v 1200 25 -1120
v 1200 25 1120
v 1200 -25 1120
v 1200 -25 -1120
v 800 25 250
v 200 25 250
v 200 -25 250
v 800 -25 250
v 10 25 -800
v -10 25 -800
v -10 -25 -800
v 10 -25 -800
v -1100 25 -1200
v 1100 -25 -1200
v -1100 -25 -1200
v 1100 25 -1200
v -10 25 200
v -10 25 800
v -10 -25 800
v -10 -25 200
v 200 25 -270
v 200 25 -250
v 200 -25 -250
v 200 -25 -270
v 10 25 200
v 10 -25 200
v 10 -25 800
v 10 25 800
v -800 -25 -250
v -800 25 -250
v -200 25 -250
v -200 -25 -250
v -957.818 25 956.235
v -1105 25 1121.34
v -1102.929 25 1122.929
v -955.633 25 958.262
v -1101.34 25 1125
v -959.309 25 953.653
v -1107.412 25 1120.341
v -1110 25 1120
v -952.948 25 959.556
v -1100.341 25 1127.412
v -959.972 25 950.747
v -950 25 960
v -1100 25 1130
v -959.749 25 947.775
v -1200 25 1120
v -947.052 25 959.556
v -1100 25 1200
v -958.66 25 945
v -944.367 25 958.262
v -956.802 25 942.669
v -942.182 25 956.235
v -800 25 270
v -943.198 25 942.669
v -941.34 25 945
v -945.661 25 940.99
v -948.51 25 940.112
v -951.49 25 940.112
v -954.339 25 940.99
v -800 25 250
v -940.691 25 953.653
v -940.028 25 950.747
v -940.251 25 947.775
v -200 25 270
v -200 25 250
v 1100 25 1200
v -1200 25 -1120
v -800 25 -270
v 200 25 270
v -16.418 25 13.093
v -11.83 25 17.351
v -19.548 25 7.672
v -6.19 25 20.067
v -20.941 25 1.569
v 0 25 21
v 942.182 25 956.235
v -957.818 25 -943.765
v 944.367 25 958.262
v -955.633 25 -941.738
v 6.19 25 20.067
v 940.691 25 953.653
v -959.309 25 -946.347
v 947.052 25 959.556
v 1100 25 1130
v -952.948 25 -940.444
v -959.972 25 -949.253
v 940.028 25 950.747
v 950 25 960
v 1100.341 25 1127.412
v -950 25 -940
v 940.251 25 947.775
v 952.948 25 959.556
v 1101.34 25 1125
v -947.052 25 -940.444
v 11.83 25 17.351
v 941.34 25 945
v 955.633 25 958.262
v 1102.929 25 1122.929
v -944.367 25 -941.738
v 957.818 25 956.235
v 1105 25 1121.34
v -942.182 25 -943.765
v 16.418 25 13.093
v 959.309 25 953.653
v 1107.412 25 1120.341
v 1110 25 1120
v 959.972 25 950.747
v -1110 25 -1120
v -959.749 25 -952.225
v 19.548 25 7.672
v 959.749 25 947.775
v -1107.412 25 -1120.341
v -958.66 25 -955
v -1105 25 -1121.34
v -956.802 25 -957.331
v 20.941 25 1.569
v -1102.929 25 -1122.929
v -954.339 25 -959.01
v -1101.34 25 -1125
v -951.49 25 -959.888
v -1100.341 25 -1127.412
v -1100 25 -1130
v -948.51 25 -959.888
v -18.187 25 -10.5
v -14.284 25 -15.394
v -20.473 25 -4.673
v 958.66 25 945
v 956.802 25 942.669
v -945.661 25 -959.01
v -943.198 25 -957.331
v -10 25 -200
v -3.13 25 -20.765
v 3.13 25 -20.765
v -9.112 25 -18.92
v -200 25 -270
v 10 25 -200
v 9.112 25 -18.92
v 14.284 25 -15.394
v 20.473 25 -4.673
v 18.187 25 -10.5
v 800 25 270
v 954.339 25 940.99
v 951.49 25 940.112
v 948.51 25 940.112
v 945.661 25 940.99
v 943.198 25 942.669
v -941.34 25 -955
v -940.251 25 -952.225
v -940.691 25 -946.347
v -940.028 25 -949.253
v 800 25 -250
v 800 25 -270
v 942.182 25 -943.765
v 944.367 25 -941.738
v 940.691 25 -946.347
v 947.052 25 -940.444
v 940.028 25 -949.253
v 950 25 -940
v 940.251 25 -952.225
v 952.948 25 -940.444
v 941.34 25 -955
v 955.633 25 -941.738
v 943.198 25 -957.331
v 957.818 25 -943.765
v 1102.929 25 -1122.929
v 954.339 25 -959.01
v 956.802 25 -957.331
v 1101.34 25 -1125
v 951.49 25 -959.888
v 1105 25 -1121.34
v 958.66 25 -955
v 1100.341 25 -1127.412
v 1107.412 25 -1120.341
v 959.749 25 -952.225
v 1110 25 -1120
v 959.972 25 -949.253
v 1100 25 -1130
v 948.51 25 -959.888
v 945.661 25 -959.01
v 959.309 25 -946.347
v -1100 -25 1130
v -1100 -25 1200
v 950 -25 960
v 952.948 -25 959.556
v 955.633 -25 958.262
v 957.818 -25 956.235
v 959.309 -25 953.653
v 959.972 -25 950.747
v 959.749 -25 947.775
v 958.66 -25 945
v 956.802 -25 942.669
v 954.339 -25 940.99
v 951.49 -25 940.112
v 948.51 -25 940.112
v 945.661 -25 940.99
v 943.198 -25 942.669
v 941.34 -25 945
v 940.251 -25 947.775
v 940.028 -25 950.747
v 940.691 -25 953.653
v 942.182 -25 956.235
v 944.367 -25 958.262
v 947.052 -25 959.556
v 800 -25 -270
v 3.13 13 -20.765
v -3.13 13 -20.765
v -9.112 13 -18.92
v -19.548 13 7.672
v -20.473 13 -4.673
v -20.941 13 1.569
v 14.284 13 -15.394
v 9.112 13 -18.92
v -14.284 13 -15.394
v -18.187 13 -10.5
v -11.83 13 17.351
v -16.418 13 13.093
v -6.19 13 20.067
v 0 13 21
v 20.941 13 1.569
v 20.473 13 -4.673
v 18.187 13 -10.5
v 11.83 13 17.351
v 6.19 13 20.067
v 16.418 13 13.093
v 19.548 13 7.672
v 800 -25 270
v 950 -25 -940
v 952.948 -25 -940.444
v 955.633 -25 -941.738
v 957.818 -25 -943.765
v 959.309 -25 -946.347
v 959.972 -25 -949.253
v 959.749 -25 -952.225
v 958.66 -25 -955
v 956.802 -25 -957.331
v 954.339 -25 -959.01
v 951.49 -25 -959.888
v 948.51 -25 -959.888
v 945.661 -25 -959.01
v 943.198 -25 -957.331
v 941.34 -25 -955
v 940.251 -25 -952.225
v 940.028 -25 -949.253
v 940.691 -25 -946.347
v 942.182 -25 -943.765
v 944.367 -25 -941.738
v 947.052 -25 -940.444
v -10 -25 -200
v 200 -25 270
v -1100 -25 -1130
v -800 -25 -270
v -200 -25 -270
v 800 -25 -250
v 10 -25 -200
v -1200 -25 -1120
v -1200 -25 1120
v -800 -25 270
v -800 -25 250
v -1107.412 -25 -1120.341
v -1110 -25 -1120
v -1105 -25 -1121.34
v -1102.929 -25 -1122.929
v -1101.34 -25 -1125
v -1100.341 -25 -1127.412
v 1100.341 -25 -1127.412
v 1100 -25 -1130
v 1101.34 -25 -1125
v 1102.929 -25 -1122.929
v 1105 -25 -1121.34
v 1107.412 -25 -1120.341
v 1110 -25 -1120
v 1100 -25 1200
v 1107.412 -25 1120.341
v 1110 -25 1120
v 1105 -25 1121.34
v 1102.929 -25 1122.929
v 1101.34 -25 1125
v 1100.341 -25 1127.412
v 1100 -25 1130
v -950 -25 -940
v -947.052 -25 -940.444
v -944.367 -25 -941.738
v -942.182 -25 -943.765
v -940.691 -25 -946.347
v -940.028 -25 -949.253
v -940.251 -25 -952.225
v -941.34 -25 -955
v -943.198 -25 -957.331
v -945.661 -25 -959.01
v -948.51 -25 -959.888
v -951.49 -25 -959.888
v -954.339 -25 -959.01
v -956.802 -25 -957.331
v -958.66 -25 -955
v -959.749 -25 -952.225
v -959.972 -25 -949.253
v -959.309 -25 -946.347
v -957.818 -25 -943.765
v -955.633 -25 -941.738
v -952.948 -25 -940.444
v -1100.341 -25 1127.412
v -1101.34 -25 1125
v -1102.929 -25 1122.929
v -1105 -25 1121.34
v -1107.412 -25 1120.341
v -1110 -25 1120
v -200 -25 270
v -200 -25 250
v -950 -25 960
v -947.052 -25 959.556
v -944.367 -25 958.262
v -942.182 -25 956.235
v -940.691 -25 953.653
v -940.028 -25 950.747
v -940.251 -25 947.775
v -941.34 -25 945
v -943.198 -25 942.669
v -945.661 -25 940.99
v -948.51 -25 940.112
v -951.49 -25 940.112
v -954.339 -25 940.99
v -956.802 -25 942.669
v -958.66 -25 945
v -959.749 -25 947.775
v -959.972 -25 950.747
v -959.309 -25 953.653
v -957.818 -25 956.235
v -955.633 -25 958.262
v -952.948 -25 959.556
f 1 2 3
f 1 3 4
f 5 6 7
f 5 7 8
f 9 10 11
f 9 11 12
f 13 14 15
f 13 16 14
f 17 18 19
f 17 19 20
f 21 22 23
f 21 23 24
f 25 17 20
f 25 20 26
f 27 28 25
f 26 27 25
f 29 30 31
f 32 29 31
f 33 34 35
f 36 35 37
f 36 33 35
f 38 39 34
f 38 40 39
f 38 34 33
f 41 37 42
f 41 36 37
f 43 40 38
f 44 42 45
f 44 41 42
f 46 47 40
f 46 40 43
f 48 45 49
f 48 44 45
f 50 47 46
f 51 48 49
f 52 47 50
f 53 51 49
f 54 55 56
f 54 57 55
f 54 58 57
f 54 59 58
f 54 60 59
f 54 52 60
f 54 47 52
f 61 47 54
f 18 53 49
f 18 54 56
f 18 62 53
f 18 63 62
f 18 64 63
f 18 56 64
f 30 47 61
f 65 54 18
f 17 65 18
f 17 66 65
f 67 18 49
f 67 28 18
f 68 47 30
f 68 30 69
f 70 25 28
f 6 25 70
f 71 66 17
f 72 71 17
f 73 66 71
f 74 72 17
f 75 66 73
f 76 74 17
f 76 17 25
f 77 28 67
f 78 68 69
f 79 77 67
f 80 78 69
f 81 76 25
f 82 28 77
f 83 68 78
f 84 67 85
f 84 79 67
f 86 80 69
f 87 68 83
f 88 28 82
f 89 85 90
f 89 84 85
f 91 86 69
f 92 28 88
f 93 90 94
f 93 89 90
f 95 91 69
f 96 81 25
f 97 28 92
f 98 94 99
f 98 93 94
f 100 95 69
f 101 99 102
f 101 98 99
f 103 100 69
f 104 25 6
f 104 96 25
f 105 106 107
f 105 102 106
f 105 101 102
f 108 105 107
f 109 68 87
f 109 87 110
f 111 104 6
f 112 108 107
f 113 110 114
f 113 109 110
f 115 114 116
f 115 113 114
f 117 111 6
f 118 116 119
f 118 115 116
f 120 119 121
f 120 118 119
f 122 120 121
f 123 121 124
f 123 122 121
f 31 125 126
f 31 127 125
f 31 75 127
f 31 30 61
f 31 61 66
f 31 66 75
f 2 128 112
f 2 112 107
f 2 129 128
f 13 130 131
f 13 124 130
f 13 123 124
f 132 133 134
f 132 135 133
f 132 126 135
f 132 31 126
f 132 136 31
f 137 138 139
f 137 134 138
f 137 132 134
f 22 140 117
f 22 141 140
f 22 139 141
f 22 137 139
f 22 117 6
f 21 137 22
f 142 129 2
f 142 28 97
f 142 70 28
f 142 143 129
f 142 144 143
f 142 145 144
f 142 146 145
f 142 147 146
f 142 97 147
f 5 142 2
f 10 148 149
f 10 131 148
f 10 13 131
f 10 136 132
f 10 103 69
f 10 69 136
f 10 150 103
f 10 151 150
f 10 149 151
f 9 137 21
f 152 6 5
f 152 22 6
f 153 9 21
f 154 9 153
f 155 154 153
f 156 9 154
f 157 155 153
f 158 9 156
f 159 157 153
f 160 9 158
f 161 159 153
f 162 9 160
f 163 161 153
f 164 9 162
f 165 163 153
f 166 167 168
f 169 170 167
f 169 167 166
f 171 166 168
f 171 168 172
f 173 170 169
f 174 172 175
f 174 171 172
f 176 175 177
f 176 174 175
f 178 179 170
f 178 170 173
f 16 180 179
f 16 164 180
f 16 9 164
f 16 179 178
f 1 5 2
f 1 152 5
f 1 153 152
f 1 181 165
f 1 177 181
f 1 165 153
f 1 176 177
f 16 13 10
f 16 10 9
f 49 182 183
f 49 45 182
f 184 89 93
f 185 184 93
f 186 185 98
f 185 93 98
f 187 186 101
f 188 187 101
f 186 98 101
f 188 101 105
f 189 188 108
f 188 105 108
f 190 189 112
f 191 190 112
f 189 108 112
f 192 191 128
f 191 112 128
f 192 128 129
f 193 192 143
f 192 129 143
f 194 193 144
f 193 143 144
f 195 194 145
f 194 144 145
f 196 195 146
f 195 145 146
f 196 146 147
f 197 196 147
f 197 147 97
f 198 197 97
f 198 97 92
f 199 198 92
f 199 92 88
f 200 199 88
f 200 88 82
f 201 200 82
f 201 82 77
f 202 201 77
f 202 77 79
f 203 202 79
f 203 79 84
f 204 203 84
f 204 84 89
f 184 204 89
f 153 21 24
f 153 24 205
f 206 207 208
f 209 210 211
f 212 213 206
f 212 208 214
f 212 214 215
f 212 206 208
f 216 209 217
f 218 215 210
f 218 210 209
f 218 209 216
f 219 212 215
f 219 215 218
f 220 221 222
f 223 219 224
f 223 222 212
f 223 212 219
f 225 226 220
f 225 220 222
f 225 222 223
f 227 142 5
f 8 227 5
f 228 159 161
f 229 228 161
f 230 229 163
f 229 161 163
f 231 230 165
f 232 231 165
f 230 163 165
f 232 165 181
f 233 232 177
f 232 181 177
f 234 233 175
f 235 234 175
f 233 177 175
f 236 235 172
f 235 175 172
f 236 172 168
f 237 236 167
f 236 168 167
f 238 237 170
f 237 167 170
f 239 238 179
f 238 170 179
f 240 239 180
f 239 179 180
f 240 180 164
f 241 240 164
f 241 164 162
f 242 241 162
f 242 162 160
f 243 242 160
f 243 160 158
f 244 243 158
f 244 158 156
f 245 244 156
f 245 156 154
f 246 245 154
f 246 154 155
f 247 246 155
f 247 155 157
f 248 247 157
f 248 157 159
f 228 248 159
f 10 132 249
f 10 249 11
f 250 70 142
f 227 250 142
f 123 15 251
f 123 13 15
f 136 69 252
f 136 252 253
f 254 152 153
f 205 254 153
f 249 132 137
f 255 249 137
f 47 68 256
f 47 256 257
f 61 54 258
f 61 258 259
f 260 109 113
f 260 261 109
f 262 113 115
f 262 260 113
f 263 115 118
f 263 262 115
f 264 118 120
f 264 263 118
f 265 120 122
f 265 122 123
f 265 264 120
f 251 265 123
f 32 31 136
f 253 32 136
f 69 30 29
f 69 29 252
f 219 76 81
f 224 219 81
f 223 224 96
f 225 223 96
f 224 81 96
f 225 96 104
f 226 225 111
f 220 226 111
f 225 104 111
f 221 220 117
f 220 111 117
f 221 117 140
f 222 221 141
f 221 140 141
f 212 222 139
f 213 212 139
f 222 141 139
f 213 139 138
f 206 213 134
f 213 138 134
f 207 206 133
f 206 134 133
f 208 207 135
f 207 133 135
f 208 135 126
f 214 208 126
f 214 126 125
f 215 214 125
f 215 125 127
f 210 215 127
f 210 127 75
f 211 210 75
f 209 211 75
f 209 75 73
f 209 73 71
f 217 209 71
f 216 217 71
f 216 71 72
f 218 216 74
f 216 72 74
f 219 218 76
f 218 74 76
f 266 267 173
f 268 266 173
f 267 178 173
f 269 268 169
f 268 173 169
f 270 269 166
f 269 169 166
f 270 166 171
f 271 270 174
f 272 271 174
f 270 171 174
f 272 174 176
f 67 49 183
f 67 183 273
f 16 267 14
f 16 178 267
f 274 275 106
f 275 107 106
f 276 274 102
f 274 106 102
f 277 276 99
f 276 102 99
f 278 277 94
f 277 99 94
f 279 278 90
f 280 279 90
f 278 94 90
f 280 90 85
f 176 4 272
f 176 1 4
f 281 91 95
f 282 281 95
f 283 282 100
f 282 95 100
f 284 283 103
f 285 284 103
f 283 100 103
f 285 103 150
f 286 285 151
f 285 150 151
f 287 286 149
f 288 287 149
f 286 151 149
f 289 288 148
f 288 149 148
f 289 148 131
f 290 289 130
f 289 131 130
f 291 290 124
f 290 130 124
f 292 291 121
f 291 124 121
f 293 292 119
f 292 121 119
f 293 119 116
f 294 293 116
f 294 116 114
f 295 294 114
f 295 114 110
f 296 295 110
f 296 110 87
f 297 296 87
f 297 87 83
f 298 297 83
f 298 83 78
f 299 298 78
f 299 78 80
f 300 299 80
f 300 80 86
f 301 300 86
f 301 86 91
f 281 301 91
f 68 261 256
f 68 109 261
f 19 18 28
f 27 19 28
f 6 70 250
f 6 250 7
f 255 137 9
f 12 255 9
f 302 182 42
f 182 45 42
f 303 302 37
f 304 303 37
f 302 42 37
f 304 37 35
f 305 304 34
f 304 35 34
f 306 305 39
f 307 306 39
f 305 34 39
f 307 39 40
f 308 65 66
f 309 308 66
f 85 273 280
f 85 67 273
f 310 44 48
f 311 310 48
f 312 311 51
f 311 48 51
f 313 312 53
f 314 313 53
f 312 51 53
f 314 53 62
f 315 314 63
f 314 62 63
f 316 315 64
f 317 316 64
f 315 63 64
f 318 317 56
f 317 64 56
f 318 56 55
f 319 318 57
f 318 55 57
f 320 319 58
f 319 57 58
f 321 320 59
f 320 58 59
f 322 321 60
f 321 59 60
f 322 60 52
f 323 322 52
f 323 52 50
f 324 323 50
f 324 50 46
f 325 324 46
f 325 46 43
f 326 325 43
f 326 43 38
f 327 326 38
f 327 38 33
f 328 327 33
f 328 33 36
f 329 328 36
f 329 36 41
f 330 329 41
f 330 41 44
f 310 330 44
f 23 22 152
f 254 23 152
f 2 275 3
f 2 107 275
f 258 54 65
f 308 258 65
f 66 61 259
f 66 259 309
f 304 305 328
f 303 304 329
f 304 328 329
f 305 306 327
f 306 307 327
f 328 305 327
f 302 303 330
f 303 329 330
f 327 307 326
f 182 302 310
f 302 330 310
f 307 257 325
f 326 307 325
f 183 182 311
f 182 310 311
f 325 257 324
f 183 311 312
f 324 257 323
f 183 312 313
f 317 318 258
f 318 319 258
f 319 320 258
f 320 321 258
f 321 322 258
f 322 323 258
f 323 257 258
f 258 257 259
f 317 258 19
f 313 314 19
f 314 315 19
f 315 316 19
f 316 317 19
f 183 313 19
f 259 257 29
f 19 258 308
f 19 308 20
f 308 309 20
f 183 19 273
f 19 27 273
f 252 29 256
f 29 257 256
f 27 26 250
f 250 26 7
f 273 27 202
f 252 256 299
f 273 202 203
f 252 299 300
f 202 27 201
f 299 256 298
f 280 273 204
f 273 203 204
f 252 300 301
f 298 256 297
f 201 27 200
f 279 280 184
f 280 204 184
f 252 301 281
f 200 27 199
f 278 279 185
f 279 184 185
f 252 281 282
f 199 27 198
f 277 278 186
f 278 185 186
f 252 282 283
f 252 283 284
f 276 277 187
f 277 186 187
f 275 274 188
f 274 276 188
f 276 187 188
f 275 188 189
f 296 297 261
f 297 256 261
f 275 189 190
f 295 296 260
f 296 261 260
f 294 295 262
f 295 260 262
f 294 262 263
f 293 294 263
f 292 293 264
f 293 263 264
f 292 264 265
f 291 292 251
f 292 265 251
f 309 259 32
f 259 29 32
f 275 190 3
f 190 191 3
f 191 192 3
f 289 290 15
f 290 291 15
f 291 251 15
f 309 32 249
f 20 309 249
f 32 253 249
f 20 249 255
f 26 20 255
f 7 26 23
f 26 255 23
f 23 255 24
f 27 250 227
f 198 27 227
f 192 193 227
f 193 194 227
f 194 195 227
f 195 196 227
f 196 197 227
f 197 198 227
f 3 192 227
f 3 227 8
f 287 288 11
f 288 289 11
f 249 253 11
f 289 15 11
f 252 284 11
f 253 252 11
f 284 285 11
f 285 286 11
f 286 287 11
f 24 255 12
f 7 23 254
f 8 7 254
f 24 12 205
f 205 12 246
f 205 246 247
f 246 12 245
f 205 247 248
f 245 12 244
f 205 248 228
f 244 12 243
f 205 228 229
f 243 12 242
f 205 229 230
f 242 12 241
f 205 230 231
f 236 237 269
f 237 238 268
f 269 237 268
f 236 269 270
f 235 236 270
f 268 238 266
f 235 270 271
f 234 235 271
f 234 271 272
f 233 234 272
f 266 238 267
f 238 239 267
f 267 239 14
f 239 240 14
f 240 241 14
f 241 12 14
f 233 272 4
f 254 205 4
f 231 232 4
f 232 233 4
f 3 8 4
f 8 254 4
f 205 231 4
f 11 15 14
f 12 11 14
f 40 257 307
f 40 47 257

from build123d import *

# Parameters (mm, degrees)
EXTRUDE_1_DEPTH     = 25
FILLET_1_R          = 10
SKETCH_2_R          = 10
CUT_EXTRUDE_1_DEPTH = 1698.792684635
SKETCH_3_R          = 21
CUT_EXTRUDE_2_DEPTH = 12
SKETCH_4_W          = 20
SKETCH_4_H          = 600
SKETCH_4_W_2        = 600
SKETCH_4_H_2        = 20
CUT_EXTRUDE_3_DEPTH = 1698.792684635


with BuildPart() as part:
    # Эскиз1 → Бобышка-Вытянуть1 (new, symmetric)
    with BuildSketch(Plane(origin=(0, 0, 0), x_dir=(1, 0, 0), z_dir=(0, 1, 0))):
        Polygon((-1100, 1120), (-1200, 1120), (-1200, -1120), (-1100, -1120), (-1100, -1200), (1100, -1200), (1100, -1120), (1200, -1120), (1200, 1120), (1100, 1120), (1100, 1200), (-1100, 1200), align=None)
    extrude(amount=EXTRUDE_1_DEPTH, both=True)

    # Скругление1
    fillet_1_edges = [part.edges().sort_by_distance(p)[0] for p in [
        (-1100, 0, -1120),
        (1100, 0, -1120),
        (1100, 0, 1120),
        (-1100, 0, 1120),
    ]]
    fillet(fillet_1_edges, radius=FILLET_1_R)

    # Эскиз2 → Вырез-Вытянуть1 (cut, through all)
    with BuildSketch(Plane(origin=(0, 25, 0), x_dir=(1, 0, 0), z_dir=(0, 1, 0))):
        with Locations(Location((-950, 950, 0), (0, 0, 270))):
            Circle(SKETCH_2_R)
        with Locations(Location((950, 950, 0), (0, 0, 270))):
            Circle(SKETCH_2_R)
        with Locations(Location((950, -950, 0), (0, 0, 270))):
            Circle(SKETCH_2_R)
        with Locations(Location((-950, -950, 0), (0, 0, 270))):
            Circle(SKETCH_2_R)
    extrude(amount=-CUT_EXTRUDE_1_DEPTH, mode=Mode.SUBTRACT)

    # Эскиз3 → Вырез-Вытянуть2 (cut)
    with BuildSketch(Plane(origin=(0, 25, 0), x_dir=(1, 0, 0), z_dir=(0, 1, 0))):
        with Locations(Location((0, 0, 0), (0, 0, 270))):
            Circle(SKETCH_3_R)
    extrude(amount=-CUT_EXTRUDE_2_DEPTH, mode=Mode.SUBTRACT)

    # Эскиз4 → Вырез-Вытянуть3 (cut, through all)
    with BuildSketch(Plane(origin=(0, 25, 0), x_dir=(1, 0, 0), z_dir=(0, 1, 0))):
        with Locations((0, -500)):
            Rectangle(SKETCH_4_W, SKETCH_4_H)
        with Locations((0, 500)):
            Rectangle(SKETCH_4_W, SKETCH_4_H)
        with Locations((500, -260)):
            Rectangle(SKETCH_4_W_2, SKETCH_4_H_2)
        with Locations((500, 260)):
            Rectangle(SKETCH_4_W_2, SKETCH_4_H_2)
        with Locations((-500, -260)):
            Rectangle(SKETCH_4_W_2, SKETCH_4_H_2)
        with Locations((-500, 260)):
            Rectangle(SKETCH_4_W_2, SKETCH_4_H_2)
    extrude(amount=-CUT_EXTRUDE_3_DEPTH, mode=Mode.SUBTRACT)


solid = part.part
